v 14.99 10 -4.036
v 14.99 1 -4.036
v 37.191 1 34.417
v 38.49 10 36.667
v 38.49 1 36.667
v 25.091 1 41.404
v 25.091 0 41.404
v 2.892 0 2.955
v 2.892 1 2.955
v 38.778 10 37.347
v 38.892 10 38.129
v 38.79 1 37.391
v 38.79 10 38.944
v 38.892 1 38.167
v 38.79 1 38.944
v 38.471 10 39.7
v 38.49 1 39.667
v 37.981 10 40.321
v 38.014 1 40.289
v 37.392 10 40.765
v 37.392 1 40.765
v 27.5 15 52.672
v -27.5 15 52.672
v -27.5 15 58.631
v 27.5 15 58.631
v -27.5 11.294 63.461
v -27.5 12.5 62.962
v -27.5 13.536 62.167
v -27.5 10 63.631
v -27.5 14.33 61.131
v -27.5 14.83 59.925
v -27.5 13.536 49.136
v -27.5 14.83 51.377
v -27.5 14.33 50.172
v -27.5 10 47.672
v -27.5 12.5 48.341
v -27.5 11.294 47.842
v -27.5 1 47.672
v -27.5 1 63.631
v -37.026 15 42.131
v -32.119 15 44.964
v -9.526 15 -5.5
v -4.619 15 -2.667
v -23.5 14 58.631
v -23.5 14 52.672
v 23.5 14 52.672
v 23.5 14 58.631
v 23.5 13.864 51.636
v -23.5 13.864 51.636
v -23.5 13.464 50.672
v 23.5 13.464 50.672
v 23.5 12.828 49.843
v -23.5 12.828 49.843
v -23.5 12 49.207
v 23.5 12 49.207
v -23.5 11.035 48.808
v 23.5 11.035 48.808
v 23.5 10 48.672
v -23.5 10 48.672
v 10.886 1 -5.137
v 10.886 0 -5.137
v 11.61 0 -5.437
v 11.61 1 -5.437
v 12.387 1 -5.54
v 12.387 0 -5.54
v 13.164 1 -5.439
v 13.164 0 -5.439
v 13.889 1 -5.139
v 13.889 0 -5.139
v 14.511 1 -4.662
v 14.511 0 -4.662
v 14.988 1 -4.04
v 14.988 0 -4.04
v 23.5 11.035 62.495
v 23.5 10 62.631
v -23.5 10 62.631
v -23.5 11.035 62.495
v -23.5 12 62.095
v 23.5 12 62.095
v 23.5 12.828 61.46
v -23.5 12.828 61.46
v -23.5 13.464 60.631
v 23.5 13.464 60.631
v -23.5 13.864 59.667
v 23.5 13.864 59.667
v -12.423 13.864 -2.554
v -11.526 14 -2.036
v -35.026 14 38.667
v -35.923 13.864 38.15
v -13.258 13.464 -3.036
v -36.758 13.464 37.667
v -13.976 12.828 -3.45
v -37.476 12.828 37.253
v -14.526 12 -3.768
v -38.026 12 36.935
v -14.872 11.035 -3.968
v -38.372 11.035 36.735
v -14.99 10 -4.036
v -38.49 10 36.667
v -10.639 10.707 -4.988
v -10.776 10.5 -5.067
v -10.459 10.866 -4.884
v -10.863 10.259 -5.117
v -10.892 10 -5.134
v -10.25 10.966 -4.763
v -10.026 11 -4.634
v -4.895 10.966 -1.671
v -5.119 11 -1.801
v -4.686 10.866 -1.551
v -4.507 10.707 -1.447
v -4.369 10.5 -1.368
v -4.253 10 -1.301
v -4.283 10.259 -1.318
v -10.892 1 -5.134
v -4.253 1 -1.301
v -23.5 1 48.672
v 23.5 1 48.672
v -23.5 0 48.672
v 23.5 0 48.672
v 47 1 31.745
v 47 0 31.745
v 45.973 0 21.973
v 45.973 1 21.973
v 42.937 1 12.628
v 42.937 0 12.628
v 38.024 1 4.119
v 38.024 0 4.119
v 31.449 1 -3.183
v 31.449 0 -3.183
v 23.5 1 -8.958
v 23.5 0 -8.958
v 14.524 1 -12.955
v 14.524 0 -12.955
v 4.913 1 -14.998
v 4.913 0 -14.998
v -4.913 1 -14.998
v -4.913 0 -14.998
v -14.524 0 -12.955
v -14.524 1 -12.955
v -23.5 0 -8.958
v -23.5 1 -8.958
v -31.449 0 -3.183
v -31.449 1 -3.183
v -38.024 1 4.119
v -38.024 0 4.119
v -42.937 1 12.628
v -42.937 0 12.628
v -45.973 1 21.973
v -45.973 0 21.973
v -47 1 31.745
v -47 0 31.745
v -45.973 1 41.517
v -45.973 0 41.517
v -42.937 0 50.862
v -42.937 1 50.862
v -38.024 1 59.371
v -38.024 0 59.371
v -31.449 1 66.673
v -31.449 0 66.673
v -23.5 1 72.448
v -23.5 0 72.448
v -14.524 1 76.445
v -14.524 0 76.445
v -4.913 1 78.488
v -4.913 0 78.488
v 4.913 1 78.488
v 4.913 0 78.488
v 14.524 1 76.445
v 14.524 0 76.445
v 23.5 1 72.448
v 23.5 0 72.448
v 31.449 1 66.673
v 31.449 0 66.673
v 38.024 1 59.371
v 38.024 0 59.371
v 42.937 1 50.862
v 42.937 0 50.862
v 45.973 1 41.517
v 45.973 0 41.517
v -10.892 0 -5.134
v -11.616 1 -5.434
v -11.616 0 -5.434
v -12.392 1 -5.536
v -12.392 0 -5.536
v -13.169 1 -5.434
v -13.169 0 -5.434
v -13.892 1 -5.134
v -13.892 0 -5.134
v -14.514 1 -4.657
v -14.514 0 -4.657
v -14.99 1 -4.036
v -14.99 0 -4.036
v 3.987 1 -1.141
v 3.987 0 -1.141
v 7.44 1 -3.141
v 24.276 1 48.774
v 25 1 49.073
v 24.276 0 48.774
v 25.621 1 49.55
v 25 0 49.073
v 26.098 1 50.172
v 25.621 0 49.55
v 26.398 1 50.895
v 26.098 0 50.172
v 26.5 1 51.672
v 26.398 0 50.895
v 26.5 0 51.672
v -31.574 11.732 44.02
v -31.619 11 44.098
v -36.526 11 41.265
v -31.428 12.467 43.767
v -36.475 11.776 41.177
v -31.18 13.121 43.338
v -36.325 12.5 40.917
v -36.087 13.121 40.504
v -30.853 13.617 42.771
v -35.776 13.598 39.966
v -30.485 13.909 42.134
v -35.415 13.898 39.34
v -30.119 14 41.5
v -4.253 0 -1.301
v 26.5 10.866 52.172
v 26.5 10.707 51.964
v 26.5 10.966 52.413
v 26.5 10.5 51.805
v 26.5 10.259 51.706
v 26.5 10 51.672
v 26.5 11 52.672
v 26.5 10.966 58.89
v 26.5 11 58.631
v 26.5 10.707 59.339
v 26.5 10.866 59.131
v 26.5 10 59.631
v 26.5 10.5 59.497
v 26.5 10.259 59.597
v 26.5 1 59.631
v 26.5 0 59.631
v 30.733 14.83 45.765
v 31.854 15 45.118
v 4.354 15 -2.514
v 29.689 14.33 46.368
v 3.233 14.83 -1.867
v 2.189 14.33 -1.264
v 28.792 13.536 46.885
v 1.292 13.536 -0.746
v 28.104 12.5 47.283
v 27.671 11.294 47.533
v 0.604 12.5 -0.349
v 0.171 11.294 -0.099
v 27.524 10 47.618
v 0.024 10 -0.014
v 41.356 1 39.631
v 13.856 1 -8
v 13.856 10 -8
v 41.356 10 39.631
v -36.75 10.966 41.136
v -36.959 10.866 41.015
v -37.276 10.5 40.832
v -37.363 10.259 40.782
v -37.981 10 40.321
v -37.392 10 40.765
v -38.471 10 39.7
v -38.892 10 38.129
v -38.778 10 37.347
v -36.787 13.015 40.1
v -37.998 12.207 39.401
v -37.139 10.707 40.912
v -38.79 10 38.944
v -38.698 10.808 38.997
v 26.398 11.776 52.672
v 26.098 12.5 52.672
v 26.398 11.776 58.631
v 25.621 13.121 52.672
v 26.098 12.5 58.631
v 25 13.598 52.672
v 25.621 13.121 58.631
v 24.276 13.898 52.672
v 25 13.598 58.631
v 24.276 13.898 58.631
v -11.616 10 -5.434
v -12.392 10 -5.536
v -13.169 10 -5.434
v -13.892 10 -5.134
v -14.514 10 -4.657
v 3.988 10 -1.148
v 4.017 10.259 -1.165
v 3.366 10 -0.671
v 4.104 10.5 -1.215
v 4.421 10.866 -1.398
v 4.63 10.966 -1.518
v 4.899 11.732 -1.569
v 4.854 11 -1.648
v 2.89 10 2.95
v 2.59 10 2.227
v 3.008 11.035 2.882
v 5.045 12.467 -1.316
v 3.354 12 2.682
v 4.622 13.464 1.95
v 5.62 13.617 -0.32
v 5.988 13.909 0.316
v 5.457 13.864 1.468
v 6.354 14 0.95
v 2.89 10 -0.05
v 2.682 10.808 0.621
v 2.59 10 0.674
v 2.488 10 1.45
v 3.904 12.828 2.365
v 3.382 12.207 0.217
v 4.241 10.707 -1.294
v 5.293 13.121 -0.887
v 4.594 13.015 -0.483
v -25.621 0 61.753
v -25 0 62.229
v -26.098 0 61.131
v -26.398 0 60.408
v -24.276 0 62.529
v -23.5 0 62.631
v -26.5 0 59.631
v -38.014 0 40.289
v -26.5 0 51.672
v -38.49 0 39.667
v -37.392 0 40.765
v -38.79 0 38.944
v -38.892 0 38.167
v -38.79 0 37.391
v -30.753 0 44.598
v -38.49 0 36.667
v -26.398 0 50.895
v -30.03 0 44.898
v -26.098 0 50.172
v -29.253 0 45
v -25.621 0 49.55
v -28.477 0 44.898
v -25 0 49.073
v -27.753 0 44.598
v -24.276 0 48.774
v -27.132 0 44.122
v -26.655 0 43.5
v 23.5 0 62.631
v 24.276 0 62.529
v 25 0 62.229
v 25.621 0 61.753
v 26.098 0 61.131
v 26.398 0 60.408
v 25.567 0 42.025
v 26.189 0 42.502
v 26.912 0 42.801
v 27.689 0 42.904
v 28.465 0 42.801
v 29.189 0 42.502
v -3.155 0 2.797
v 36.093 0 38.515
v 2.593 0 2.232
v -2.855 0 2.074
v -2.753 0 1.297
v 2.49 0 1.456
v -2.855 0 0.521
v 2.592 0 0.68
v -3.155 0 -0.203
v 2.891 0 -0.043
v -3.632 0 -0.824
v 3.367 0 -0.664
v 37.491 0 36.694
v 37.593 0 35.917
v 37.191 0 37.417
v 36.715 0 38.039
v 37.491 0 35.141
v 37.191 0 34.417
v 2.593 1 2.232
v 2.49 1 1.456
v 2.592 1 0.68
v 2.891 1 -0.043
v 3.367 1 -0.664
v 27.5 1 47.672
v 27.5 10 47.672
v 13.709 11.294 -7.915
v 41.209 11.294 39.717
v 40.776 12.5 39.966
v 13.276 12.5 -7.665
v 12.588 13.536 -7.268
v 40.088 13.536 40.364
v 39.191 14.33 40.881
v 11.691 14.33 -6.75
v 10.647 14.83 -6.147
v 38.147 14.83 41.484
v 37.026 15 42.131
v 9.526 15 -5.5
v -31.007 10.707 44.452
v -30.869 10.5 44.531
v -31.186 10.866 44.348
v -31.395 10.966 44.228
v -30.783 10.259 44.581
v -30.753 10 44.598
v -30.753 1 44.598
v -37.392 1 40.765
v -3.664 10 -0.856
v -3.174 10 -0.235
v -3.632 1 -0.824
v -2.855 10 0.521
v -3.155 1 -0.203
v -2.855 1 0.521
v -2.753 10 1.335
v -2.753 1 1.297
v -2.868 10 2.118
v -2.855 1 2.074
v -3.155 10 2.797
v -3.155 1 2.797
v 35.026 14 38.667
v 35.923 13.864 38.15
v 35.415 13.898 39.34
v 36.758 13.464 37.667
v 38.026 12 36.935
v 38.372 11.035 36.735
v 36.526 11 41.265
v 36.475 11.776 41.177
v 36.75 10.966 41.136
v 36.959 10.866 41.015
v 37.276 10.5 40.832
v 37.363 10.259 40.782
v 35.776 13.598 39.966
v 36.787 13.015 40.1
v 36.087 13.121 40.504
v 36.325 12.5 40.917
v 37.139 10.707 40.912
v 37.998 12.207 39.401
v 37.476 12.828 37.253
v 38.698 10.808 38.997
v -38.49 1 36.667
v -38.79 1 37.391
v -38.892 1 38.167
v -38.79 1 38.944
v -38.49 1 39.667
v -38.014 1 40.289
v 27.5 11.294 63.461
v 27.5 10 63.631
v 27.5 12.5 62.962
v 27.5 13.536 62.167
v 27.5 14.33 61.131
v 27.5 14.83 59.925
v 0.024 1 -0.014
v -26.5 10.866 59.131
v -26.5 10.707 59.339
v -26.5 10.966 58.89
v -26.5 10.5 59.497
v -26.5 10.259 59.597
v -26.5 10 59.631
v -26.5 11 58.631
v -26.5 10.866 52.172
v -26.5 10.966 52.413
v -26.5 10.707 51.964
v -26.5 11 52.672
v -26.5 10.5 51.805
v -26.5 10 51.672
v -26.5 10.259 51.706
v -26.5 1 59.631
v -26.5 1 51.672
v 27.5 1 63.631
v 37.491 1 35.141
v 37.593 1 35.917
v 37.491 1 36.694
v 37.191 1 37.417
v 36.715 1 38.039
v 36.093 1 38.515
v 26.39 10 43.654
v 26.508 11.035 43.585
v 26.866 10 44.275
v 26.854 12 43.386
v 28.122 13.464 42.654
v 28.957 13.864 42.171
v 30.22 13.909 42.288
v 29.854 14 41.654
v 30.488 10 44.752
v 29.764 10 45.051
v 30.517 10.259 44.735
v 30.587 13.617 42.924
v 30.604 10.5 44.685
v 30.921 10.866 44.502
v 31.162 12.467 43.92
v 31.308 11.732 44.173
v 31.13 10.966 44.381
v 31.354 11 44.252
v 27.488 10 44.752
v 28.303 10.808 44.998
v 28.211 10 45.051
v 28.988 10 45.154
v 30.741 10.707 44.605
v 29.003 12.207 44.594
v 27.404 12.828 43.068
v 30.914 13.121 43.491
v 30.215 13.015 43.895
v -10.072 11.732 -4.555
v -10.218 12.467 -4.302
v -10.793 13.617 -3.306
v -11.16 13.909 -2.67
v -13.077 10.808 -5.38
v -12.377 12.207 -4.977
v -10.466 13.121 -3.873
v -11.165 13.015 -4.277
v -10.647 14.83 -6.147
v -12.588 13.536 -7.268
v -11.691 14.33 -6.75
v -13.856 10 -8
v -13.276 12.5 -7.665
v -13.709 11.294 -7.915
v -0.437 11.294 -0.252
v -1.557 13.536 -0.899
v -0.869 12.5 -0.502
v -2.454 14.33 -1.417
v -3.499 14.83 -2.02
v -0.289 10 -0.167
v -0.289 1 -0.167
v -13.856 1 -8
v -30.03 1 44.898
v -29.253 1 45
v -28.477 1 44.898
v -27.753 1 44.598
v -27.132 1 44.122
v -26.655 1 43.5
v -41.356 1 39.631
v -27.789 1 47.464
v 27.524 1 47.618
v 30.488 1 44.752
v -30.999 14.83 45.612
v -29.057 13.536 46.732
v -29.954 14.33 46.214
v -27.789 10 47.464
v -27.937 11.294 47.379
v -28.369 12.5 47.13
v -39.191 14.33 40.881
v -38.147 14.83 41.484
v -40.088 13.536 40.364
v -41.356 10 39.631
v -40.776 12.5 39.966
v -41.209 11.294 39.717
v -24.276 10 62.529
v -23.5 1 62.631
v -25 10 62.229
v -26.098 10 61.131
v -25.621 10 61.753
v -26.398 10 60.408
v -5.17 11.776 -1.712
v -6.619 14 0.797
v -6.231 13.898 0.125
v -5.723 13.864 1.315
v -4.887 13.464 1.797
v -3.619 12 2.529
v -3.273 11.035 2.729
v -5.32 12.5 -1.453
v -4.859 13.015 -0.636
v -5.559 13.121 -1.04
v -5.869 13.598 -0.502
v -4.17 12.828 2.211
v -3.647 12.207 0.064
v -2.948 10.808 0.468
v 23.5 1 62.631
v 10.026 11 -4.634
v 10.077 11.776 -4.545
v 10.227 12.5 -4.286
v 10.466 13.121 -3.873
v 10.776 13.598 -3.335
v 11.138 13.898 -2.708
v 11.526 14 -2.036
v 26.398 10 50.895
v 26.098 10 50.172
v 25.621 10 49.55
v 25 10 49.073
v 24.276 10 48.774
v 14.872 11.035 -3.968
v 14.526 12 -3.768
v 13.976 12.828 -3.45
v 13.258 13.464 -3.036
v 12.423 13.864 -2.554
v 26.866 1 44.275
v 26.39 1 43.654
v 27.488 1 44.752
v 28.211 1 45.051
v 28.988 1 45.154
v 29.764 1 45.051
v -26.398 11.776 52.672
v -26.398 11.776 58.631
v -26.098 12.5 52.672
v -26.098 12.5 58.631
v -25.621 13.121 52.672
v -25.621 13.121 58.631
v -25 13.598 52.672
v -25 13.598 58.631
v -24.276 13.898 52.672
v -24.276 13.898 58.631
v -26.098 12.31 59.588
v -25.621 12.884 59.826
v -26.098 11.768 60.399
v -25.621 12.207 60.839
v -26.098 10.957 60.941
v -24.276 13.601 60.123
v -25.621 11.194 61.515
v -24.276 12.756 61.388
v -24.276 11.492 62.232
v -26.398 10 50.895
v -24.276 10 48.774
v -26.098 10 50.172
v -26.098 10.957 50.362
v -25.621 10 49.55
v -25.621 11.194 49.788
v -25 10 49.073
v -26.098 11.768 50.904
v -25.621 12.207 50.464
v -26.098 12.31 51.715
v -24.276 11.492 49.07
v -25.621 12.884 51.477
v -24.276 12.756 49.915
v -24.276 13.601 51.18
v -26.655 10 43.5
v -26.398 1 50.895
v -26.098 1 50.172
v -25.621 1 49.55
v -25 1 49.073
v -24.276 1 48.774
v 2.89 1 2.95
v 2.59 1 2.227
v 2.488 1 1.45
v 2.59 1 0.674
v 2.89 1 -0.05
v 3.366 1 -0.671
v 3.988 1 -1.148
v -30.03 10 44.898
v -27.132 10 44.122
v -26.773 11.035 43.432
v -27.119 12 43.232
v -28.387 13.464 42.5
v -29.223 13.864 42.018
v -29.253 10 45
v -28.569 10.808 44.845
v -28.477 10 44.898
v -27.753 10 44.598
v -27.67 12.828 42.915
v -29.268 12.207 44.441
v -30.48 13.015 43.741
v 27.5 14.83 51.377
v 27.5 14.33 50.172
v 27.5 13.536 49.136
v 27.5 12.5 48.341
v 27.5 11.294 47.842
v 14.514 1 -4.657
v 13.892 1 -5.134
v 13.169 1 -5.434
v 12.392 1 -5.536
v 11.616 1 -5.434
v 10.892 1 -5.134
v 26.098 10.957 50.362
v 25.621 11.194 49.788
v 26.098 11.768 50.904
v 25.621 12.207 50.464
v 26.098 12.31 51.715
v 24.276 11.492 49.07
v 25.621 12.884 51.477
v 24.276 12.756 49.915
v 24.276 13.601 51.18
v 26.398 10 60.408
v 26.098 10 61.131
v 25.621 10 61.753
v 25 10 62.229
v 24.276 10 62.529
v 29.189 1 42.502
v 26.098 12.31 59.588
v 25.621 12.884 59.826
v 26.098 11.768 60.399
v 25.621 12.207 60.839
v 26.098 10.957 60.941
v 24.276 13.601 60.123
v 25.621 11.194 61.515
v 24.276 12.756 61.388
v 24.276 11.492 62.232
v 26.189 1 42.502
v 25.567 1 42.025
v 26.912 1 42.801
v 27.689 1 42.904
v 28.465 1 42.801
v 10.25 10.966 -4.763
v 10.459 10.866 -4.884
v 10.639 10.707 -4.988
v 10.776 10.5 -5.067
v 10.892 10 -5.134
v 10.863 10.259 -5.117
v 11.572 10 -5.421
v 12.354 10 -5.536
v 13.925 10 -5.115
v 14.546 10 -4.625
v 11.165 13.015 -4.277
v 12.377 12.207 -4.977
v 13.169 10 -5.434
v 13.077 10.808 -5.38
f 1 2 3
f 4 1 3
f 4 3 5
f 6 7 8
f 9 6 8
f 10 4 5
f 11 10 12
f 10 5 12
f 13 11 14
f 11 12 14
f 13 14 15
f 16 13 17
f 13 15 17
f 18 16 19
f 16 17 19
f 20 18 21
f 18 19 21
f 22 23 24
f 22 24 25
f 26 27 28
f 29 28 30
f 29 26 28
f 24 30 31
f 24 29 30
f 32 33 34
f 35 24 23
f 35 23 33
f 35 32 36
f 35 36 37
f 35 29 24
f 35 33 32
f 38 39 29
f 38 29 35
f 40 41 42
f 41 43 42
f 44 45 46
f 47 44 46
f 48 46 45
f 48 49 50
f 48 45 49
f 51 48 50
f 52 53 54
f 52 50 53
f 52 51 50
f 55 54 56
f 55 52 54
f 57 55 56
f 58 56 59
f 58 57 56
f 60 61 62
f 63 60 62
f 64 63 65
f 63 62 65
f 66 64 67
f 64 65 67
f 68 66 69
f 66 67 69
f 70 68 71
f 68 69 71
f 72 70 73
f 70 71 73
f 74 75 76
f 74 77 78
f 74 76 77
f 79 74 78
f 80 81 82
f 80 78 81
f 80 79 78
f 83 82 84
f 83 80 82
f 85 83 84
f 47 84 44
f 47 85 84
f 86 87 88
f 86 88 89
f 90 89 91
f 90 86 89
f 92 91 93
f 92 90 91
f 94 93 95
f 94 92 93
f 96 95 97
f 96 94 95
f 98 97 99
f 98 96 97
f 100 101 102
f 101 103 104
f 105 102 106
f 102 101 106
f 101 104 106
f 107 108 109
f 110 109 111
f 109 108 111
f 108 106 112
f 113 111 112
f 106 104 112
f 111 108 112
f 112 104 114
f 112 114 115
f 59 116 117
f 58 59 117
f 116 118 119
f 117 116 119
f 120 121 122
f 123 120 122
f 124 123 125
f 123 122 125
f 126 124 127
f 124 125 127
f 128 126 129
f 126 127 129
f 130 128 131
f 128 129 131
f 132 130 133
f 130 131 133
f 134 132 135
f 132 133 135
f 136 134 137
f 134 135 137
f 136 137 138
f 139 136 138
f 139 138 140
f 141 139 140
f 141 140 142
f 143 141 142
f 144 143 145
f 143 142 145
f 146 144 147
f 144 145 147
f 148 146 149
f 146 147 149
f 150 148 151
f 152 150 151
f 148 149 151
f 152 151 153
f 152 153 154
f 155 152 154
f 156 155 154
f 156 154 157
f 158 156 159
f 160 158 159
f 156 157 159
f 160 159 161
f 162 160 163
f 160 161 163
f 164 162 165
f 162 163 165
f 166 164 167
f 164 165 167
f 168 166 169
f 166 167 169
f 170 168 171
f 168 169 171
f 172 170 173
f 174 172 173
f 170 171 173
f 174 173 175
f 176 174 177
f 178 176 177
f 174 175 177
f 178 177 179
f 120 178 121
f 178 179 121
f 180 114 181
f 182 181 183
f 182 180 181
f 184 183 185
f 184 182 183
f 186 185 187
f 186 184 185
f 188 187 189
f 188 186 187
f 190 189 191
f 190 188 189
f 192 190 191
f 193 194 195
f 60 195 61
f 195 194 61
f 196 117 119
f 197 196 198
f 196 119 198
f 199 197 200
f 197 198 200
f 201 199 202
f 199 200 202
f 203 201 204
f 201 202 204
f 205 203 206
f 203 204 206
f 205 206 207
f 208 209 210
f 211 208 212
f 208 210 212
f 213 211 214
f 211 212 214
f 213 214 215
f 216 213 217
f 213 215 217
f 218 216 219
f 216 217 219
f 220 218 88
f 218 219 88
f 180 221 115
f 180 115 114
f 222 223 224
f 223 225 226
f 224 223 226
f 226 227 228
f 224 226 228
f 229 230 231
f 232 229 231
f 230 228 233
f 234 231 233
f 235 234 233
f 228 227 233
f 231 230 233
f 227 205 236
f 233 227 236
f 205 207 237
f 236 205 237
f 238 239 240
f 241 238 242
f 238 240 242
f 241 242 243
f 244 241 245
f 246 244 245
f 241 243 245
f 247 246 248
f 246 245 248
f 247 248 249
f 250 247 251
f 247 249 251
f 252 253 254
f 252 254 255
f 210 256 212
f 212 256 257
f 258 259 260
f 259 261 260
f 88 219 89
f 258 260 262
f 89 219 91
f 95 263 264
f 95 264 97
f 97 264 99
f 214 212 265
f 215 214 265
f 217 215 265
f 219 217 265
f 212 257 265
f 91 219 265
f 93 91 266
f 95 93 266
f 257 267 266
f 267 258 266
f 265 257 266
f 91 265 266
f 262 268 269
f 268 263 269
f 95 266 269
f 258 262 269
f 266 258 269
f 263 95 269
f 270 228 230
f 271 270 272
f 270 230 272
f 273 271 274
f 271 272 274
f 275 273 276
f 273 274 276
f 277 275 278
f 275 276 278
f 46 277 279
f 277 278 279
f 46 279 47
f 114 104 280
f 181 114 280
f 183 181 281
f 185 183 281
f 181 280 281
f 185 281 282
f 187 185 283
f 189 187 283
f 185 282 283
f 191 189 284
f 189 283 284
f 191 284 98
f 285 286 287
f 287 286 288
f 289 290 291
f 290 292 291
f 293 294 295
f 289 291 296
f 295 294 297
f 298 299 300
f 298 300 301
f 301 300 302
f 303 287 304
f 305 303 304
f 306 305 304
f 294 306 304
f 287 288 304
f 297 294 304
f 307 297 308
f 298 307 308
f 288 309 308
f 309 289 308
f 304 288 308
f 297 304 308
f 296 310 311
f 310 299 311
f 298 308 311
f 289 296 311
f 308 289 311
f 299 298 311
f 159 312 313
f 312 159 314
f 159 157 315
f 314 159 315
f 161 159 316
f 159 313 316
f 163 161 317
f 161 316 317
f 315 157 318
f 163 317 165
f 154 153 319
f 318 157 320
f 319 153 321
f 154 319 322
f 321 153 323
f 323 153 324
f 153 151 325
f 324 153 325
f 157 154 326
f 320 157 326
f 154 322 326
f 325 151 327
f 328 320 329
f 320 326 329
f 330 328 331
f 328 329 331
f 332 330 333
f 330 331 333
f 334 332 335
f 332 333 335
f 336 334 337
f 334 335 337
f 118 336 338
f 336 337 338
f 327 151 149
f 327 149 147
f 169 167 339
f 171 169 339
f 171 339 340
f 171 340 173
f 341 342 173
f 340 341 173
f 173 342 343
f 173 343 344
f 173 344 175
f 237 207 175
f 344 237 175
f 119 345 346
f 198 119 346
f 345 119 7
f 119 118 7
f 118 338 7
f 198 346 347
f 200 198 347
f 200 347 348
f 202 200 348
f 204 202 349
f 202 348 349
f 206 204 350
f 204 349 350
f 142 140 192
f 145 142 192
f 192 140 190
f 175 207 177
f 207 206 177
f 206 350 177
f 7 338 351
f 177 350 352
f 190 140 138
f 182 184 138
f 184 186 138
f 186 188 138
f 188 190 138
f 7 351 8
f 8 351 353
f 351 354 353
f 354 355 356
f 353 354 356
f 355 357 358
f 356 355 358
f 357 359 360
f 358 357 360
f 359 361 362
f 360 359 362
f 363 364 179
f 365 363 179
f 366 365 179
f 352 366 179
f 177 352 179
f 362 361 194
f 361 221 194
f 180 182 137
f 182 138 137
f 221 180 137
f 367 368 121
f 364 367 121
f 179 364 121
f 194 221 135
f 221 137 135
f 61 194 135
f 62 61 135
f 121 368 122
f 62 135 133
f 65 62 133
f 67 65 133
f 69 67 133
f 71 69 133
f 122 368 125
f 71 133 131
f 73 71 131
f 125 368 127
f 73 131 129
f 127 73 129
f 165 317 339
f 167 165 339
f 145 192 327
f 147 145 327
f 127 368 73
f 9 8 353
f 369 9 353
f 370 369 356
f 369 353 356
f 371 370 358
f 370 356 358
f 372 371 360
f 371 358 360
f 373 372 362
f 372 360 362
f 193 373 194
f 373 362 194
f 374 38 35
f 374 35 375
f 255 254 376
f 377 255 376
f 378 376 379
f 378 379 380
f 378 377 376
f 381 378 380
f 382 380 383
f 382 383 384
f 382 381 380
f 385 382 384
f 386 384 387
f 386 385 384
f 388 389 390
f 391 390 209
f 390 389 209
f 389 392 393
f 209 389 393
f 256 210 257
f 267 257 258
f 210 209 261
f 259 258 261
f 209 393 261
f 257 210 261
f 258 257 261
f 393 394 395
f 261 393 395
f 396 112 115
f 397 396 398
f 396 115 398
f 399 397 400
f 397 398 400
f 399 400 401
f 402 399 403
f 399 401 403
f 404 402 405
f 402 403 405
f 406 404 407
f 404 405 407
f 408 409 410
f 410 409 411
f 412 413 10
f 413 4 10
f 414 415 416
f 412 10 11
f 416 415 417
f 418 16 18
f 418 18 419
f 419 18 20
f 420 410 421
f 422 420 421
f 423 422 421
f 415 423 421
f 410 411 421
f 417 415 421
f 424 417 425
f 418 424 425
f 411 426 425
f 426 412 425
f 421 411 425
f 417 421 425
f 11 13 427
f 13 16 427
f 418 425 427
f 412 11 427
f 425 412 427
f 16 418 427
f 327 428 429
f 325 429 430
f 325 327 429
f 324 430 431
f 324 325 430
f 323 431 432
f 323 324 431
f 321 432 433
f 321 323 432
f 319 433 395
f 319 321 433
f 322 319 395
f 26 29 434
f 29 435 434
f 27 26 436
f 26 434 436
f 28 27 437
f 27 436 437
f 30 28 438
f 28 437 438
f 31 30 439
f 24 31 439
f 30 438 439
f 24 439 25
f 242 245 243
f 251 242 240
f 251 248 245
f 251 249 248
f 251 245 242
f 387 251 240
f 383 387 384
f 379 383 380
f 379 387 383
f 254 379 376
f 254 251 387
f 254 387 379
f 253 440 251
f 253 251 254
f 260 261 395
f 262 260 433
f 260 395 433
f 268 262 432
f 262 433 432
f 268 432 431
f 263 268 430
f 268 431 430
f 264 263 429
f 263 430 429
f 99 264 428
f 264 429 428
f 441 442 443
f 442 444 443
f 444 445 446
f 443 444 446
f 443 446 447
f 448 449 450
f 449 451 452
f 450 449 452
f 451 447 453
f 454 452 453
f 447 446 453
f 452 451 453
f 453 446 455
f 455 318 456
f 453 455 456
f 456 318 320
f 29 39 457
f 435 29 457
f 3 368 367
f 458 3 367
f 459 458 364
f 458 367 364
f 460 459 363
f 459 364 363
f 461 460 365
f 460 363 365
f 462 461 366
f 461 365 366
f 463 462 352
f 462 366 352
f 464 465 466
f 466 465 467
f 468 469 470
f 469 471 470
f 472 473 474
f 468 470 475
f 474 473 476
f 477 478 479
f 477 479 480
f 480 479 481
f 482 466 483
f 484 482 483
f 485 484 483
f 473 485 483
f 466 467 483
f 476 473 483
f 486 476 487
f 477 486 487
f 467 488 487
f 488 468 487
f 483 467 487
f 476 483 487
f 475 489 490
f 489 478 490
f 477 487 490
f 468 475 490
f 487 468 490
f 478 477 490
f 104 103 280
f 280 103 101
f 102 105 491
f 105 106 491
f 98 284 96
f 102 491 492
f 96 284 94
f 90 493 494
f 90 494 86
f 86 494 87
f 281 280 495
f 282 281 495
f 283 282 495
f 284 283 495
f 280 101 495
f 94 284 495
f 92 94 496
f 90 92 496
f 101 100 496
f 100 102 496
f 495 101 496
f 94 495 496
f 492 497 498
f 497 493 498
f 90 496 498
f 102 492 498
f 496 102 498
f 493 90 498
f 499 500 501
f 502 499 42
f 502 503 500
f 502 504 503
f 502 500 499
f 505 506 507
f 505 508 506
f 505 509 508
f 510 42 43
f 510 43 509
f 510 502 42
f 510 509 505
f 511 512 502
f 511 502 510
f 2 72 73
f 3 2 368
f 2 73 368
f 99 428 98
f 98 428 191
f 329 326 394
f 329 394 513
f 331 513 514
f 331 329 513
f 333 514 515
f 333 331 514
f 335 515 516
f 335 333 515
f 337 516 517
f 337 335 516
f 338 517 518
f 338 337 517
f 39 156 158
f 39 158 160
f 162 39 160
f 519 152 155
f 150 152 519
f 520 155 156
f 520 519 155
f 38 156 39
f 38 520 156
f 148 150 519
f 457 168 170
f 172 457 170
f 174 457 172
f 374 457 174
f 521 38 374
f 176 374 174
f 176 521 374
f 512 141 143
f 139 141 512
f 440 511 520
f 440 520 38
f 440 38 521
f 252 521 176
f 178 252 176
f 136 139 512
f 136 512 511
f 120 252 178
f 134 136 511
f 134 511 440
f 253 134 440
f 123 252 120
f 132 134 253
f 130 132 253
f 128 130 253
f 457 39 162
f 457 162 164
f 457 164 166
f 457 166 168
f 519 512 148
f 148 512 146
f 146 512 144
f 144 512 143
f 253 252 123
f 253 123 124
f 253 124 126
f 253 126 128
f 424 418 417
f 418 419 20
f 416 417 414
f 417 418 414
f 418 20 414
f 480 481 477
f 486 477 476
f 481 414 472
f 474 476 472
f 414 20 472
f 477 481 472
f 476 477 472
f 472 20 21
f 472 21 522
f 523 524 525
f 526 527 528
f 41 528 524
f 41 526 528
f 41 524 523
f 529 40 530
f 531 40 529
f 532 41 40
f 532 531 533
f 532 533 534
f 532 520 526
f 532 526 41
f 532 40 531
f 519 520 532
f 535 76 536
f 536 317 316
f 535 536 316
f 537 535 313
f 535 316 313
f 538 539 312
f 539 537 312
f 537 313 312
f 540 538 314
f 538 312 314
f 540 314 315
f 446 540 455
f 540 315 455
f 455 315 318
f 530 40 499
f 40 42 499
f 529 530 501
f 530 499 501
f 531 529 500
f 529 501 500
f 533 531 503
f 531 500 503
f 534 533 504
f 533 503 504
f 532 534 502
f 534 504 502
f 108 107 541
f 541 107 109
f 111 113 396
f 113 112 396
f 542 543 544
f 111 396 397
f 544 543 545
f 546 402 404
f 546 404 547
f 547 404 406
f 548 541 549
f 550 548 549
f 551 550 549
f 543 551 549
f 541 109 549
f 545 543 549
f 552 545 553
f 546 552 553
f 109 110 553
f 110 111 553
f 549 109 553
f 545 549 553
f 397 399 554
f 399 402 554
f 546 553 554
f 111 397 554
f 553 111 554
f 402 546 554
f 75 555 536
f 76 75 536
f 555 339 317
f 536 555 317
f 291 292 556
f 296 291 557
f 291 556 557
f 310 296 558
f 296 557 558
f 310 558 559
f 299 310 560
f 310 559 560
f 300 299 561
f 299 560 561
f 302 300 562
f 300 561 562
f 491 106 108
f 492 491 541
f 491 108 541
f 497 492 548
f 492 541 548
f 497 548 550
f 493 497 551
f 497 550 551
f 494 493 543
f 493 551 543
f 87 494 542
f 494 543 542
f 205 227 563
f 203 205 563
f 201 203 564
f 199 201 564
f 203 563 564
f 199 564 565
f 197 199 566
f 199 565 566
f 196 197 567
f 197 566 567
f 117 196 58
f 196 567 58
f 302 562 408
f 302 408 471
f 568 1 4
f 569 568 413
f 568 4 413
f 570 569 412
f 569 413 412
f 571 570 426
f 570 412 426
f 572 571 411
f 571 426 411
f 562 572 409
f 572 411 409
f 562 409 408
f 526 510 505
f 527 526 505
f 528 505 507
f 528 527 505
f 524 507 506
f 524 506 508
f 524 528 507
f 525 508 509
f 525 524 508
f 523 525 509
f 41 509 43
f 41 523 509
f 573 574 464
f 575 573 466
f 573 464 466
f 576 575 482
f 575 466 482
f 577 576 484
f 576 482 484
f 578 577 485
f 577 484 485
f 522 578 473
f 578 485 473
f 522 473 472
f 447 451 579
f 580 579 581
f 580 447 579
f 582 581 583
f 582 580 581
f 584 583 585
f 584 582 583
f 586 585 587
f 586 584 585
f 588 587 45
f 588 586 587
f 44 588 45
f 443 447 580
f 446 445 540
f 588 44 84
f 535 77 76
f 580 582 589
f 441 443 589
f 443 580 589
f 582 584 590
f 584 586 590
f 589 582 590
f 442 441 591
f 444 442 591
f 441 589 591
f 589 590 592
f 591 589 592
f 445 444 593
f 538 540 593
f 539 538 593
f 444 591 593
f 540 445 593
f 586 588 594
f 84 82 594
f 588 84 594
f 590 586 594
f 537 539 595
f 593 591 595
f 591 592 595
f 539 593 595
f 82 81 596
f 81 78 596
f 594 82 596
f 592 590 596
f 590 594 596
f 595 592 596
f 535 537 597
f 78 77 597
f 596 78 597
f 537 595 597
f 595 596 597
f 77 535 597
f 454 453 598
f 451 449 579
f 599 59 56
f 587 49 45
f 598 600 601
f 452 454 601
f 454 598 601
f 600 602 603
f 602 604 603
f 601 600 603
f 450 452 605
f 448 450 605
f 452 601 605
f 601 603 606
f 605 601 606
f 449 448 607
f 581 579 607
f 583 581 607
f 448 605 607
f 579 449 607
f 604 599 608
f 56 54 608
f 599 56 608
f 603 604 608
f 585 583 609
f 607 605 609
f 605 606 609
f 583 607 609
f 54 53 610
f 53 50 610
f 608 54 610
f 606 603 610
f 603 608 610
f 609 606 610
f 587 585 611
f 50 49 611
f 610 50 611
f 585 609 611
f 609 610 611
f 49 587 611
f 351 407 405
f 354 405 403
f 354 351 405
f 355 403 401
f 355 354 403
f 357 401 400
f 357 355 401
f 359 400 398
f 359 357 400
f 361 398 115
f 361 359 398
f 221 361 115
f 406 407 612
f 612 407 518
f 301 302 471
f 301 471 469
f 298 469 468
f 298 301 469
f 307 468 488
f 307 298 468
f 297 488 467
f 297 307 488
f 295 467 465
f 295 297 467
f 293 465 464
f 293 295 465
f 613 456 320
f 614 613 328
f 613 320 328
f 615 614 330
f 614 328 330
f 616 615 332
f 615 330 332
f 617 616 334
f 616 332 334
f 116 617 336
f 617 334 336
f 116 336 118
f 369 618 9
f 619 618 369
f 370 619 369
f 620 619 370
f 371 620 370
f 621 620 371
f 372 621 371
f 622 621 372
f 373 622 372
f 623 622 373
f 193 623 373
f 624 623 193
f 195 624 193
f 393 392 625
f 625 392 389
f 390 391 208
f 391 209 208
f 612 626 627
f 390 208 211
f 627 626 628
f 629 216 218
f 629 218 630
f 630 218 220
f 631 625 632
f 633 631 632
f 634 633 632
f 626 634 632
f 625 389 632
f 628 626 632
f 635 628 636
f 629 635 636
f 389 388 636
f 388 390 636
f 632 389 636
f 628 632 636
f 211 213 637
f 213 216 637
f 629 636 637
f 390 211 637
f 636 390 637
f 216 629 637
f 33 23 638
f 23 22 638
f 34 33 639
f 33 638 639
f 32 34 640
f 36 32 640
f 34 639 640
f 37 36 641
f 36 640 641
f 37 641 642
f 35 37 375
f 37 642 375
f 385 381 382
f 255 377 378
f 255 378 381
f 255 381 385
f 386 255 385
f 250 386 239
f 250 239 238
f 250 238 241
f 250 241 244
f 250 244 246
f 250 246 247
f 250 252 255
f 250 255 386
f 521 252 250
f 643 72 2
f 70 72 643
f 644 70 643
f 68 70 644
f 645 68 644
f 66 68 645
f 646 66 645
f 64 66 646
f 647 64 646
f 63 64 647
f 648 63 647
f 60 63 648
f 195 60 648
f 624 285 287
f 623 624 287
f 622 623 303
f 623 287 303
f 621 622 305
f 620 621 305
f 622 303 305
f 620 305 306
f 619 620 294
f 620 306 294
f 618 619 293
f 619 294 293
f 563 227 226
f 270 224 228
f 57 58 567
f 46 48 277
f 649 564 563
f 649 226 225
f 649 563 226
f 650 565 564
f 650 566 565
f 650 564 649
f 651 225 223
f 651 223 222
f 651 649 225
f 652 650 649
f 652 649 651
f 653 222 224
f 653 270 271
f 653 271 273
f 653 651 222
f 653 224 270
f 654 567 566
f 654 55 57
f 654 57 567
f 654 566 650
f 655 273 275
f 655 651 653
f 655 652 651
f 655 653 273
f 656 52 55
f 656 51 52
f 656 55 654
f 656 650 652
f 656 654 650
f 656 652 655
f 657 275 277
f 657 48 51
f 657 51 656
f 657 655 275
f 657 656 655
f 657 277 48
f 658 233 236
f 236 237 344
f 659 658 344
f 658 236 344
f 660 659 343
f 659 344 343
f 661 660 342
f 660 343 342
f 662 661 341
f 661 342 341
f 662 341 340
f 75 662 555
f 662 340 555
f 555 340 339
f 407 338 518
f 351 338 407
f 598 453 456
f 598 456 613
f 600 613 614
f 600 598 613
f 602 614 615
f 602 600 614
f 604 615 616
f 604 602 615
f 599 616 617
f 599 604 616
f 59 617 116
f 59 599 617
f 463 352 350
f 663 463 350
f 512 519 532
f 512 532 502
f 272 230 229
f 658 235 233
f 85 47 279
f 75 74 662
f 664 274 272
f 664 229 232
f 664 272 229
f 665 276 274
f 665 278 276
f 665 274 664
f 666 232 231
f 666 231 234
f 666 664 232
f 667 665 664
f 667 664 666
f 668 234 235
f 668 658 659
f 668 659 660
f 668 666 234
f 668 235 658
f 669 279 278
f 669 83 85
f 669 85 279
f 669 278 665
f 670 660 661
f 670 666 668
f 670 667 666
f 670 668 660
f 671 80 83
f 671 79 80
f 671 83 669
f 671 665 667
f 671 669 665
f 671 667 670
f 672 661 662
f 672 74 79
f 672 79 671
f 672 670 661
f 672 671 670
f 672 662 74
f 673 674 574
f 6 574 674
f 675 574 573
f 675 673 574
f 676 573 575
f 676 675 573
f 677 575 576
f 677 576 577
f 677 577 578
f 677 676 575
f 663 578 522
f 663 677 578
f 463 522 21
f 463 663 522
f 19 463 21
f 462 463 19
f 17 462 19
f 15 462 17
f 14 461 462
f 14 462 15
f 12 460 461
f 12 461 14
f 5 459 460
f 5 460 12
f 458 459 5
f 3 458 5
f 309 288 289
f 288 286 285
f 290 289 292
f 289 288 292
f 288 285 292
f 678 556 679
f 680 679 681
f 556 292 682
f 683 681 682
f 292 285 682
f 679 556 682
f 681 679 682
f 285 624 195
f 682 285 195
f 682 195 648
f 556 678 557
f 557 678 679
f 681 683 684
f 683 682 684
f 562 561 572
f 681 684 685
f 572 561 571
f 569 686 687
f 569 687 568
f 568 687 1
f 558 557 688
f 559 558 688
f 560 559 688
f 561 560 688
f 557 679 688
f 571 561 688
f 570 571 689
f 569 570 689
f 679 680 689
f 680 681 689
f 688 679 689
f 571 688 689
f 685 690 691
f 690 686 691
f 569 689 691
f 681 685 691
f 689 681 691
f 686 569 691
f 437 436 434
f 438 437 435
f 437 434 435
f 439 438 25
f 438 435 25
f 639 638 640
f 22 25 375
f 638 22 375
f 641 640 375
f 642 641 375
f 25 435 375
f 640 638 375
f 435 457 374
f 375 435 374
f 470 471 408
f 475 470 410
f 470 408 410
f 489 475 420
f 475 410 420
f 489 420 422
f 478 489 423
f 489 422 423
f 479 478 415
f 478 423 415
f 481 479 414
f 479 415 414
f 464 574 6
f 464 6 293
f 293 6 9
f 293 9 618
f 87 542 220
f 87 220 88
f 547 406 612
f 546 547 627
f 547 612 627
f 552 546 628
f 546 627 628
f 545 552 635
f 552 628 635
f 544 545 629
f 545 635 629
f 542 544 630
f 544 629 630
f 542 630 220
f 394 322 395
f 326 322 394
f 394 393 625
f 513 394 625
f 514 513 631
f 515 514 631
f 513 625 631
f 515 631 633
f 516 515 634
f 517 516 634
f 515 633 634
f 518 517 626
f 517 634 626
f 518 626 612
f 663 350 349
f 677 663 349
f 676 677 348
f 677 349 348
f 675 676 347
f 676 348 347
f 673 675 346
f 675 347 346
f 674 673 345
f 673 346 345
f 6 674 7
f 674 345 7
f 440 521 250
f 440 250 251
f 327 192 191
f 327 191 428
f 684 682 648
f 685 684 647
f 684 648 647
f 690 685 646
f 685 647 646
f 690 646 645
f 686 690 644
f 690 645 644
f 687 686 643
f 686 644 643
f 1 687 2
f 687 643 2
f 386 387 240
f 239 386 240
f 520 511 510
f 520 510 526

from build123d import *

# Parameters (mm, degrees)
BOSS_EXTRUDE1_DEPTH     = 15
SKETCH1_W               = 55
SKETCH1_H               = 15.959882119
BOSS_EXTRUDE1_2_DEPTH   = 15
BOSS_EXTRUDE1_3_DEPTH   = 15
FILLET1_R               = 5
FILLET2_R               = 5
FILLET3_R               = 5
FILLET4_R               = 5
FILLET5_R               = 5
FILLET6_R               = 5
SHELL1_T                = -1
SHELL2_T                = -1
SHELL3_T                = -1
FILLET7_R               = 3
FILLET8_R               = 3
FILLET9_R               = 3
FILLET10_R              = 3
FILLET11_R              = 3
FILLET12_R              = 3
SKETCH2_R               = 47
BOSS_EXTRUDE2_DEPTH     = 1
CUT_EXTRUDE1_DEPTH      = 1
CUT_EXTRUDE1_DEPTH_BACK = 13


with BuildPart() as part:
    # Sketch1 → Boss-Extrude1 (new body)
    with BuildSketch(Plane(origin=(0, 0, 0), x_dir=(1, 0, 0), z_dir=(0, 1, 0))):
        Polygon((0.023694735, 0.013680161), (13.856406461, 8), (41.356406461, -39.631397208), (27.523694735, -47.617717047), align=None)
    extrude(amount=BOSS_EXTRUDE1_DEPTH)

    # Fillet3
    fillet3_edges = [part.edges().sort_by_distance(p)[0] for p in [
        (27.606406461, 15, 15.815698604),
    ]]
    fillet(fillet3_edges, radius=FILLET3_R)

    # Fillet4
    fillet4_edges = [part.edges().sort_by_distance(p)[0] for p in [
        (13.773694735, 15, 23.802018443),
    ]]
    fillet(fillet4_edges, radius=FILLET4_R)

    # Shell3
    shell3_openings = [part.faces().sort_by_distance(p)[0] for p in [
        (20.690050598, 0, 19.808858523),
    ]]
    offset(amount=SHELL3_T, openings=shell3_openings, kind=Kind.INTERSECTION)

    # Fillet9
    fillet9_edges = [part.edges().sort_by_distance(p)[0] for p in [
        (2.404332011, 12.828427125, -0.233441195),
        (12.475769184, 12.828427125, -6.048188159),
        (13.490381057, 5, -6.633974596),
        (1.389720138, 5, 0.352345242),
        (7.440050598, 14, -3.140814677),
    ]]
    fillet(fillet9_edges, radius=FILLET9_R)

    # Fillet12
    fillet12_edges = [part.edges().sort_by_distance(p)[0] for p in [
        (39.990381057, 5, 39.265371804),
        (28.904332011, 12.828427125, 45.665905205),
        (27.889720138, 5, 46.251691643),
        (38.975769184, 12.828427125, 39.851158242),
        (33.940050598, 14, 42.758531724),
    ]]
    fillet(fillet12_edges, radius=FILLET12_R)



with BuildPart() as body_2:
    # Sketch1 → Boss-Extrude1 2 (new body)
    with BuildSketch(Plane(origin=(0, 0, 0), x_dir=(1, 0, 0), z_dir=(0, 1, 0))):
        with Locations((0, -55.651456149)):
            Rectangle(SKETCH1_W, SKETCH1_H)
    extrude(amount=BOSS_EXTRUDE1_2_DEPTH)

    # Fillet1
    fillet1_edges = [body_2.edges().sort_by_distance(p)[0] for p in [
        (0, 15, 63.631397208),
    ]]
    fillet(fillet1_edges, radius=FILLET1_R)

    # Fillet2
    fillet2_edges = [body_2.edges().sort_by_distance(p)[0] for p in [
        (0, 15, 47.671515089),
    ]]
    fillet(fillet2_edges, radius=FILLET2_R)

    # Shell2
    shell2_openings = [body_2.faces().sort_by_distance(p)[0] for p in [
        (0, 0, 55.651456149),
    ]]
    offset(amount=SHELL2_T, openings=shell2_openings, kind=Kind.INTERSECTION)

    # Fillet10
    fillet10_edges = [body_2.edges().sort_by_distance(p)[0] for p in [
        (-26.5, 5, 62.631397208),
        (-26.5, 12.828427125, 49.843087964),
        (-26.5, 5, 48.671515089),
        (-26.5, 12.828427125, 61.459824333),
        (-26.5, 14, 55.651456149),
    ]]
    fillet(fillet10_edges, radius=FILLET10_R)

    # Fillet11
    fillet11_edges = [body_2.edges().sort_by_distance(p)[0] for p in [
        (26.5, 12.828427125, 49.843087964),
        (26.5, 12.828427125, 61.459824333),
        (26.5, 5, 62.631397208),
        (26.5, 5, 48.671515089),
        (26.5, 14, 55.651456149),
    ]]
    fillet(fillet11_edges, radius=FILLET11_R)


with BuildPart() as body_3:
    # Sketch1 → Boss-Extrude1 3 (new body)
    with BuildSketch(Plane(origin=(0, 0, 0), x_dir=(1, 0, 0), z_dir=(0, 1, 0))):
        Polygon((-27.789098516, -47.464486102), (-41.356406461, -39.631397208), (-13.856406461, 8), (-0.289098516, 0.166911106), align=None)
    extrude(amount=BOSS_EXTRUDE1_3_DEPTH)

    # Fillet5
    fillet5_edges = [body_3.edges().sort_by_distance(p)[0] for p in [
        (-14.039098516, 15, 23.648787498),
    ]]
    fillet(fillet5_edges, radius=FILLET5_R)

    # Fillet6
    fillet6_edges = [body_3.edges().sort_by_distance(p)[0] for p in [
        (-27.606406461, 15, 15.815698604),
    ]]
    fillet(fillet6_edges, radius=FILLET6_R)

    # Shell1
    shell1_openings = [body_3.faces().sort_by_distance(p)[0] for p in [
        (-20.822752488, 0, 19.732243051),
    ]]
    offset(amount=SHELL1_T, openings=shell1_openings, kind=Kind.INTERSECTION)

    # Fillet7
    fillet7_edges = [body_3.edges().sort_by_distance(p)[0] for p in [
        (-28.155123919, 5, 46.098460699),
        (-38.975769184, 12.828427125, 39.851158242),
        (-39.990381057, 5, 39.265371804),
        (-29.169735792, 12.828427125, 45.512674261),
        (-34.072752488, 14, 42.681916251),
    ]]
    fillet(fillet7_edges, radius=FILLET7_R)

    # Fillet8
    fillet8_edges = [body_3.edges().sort_by_distance(p)[0] for p in [
        (-12.475769184, 12.828427125, -6.048188159),
        (-2.669735792, 12.828427125, -0.38667214),
        (-1.655123919, 5, 0.199114298),
        (-13.490381057, 5, -6.633974596),
        (-7.572752488, 14, -3.217430149),
    ]]
    fillet(fillet8_edges, radius=FILLET8_R)


with BuildPart() as part_1:
    add(part.part)

    add(body_2.part)  # Boss-Extrude2 merges body 2

    add(body_3.part)  # Boss-Extrude2 merges body 3
    # Sketch2 → Boss-Extrude2 (add)
    with BuildSketch(Plane(origin=(0, 0, 0), x_dir=(1, 0, 0), z_dir=(0, 1, 0))):
        with Locations((0, -31.745023024)):
            Circle(SKETCH2_R)
    extrude(amount=BOSS_EXTRUDE2_DEPTH)

    # Sketch3 → Cut-Extrude1 (cut, two sides)
    with BuildSketch(Plane(origin=(0, 0, 0), x_dir=(1, 0, 0), z_dir=(0, 1, 0))) as cut_extrude1_sk:
        with BuildLine():
            Line((3.987006883, 1.141166124), (10.886295934, 5.136526307))
            ThreePointArc((10.886295934, 5.136526307), (13.164256292, 5.43870151), (14.98777262, 4.04041633))
            Line((14.98777262, 4.04041633), (37.191342951, -34.417295593))
            ThreePointArc((37.191342951, -34.417295593), (37.491044219, -36.693752728), (36.09326674, -38.515371804))
            Line((36.09326674, -38.515371804), (29.188758244, -42.501691643))
            ThreePointArc((29.188758244, -42.501691643), (26.912301109, -42.801392911), (25.090682033, -41.403615432))
            Line((25.090682033, -41.403615432), (2.892331147, -2.954943853))
            ThreePointArc((2.892331147, -2.954943853), (2.592122178, -0.68038397), (3.987006883, 1.141166124))
        make_face()
        with BuildLine():
            Line((-23.5, -48.671515089), (23.5, -48.671515089))
            ThreePointArc((23.5, -48.671515089), (25.621320344, -49.550194746), (26.5, -51.671515089))
            Line((26.5, -51.671515089), (26.5, -59.631397208))
            ThreePointArc((26.5, -59.631397208), (25.621320344, -61.752717552), (23.5, -62.631397208))
            Line((23.5, -62.631397208), (-23.5, -62.631397208))
            ThreePointArc((-23.5, -62.631397208), (-25.621320344, -61.752717552), (-26.5, -59.631397208))
            Line((-26.5, -59.631397208), (-26.5, -51.671515089))
            ThreePointArc((-26.5, -51.671515089), (-25.621320344, -49.550194746), (-23.5, -48.671515089))
        make_face()
        with BuildLine():
            Line((-26.655123919, -43.500384487), (-3.155123919, -2.797190509))
            ThreePointArc((-3.155123919, -2.797190509), (-2.855422652, -0.520733374), (-4.253200131, 1.300885702))
            Line((-4.253200131, 1.300885702), (-10.892304845, 5.133974596))
            ThreePointArc((-10.892304845, 5.133974596), (-13.168761981, 5.433675864), (-14.990381057, 4.035898385))
            Line((-14.990381057, 4.035898385), (-38.490381057, -36.667295593))
            ThreePointArc((-38.490381057, -36.667295593), (-38.790082324, -38.943752728), (-37.392304845, -40.765371804))
            Line((-37.392304845, -40.765371804), (-30.753200131, -44.598460699))
            ThreePointArc((-30.753200131, -44.598460699), (-28.476742995, -44.898161966), (-26.655123919, -43.500384487))
        make_face()
    extrude(amount=CUT_EXTRUDE1_DEPTH, mode=Mode.SUBTRACT)
    extrude(cut_extrude1_sk.sketch, amount=-CUT_EXTRUDE1_DEPTH_BACK, mode=Mode.SUBTRACT)


solid = part_1.part
